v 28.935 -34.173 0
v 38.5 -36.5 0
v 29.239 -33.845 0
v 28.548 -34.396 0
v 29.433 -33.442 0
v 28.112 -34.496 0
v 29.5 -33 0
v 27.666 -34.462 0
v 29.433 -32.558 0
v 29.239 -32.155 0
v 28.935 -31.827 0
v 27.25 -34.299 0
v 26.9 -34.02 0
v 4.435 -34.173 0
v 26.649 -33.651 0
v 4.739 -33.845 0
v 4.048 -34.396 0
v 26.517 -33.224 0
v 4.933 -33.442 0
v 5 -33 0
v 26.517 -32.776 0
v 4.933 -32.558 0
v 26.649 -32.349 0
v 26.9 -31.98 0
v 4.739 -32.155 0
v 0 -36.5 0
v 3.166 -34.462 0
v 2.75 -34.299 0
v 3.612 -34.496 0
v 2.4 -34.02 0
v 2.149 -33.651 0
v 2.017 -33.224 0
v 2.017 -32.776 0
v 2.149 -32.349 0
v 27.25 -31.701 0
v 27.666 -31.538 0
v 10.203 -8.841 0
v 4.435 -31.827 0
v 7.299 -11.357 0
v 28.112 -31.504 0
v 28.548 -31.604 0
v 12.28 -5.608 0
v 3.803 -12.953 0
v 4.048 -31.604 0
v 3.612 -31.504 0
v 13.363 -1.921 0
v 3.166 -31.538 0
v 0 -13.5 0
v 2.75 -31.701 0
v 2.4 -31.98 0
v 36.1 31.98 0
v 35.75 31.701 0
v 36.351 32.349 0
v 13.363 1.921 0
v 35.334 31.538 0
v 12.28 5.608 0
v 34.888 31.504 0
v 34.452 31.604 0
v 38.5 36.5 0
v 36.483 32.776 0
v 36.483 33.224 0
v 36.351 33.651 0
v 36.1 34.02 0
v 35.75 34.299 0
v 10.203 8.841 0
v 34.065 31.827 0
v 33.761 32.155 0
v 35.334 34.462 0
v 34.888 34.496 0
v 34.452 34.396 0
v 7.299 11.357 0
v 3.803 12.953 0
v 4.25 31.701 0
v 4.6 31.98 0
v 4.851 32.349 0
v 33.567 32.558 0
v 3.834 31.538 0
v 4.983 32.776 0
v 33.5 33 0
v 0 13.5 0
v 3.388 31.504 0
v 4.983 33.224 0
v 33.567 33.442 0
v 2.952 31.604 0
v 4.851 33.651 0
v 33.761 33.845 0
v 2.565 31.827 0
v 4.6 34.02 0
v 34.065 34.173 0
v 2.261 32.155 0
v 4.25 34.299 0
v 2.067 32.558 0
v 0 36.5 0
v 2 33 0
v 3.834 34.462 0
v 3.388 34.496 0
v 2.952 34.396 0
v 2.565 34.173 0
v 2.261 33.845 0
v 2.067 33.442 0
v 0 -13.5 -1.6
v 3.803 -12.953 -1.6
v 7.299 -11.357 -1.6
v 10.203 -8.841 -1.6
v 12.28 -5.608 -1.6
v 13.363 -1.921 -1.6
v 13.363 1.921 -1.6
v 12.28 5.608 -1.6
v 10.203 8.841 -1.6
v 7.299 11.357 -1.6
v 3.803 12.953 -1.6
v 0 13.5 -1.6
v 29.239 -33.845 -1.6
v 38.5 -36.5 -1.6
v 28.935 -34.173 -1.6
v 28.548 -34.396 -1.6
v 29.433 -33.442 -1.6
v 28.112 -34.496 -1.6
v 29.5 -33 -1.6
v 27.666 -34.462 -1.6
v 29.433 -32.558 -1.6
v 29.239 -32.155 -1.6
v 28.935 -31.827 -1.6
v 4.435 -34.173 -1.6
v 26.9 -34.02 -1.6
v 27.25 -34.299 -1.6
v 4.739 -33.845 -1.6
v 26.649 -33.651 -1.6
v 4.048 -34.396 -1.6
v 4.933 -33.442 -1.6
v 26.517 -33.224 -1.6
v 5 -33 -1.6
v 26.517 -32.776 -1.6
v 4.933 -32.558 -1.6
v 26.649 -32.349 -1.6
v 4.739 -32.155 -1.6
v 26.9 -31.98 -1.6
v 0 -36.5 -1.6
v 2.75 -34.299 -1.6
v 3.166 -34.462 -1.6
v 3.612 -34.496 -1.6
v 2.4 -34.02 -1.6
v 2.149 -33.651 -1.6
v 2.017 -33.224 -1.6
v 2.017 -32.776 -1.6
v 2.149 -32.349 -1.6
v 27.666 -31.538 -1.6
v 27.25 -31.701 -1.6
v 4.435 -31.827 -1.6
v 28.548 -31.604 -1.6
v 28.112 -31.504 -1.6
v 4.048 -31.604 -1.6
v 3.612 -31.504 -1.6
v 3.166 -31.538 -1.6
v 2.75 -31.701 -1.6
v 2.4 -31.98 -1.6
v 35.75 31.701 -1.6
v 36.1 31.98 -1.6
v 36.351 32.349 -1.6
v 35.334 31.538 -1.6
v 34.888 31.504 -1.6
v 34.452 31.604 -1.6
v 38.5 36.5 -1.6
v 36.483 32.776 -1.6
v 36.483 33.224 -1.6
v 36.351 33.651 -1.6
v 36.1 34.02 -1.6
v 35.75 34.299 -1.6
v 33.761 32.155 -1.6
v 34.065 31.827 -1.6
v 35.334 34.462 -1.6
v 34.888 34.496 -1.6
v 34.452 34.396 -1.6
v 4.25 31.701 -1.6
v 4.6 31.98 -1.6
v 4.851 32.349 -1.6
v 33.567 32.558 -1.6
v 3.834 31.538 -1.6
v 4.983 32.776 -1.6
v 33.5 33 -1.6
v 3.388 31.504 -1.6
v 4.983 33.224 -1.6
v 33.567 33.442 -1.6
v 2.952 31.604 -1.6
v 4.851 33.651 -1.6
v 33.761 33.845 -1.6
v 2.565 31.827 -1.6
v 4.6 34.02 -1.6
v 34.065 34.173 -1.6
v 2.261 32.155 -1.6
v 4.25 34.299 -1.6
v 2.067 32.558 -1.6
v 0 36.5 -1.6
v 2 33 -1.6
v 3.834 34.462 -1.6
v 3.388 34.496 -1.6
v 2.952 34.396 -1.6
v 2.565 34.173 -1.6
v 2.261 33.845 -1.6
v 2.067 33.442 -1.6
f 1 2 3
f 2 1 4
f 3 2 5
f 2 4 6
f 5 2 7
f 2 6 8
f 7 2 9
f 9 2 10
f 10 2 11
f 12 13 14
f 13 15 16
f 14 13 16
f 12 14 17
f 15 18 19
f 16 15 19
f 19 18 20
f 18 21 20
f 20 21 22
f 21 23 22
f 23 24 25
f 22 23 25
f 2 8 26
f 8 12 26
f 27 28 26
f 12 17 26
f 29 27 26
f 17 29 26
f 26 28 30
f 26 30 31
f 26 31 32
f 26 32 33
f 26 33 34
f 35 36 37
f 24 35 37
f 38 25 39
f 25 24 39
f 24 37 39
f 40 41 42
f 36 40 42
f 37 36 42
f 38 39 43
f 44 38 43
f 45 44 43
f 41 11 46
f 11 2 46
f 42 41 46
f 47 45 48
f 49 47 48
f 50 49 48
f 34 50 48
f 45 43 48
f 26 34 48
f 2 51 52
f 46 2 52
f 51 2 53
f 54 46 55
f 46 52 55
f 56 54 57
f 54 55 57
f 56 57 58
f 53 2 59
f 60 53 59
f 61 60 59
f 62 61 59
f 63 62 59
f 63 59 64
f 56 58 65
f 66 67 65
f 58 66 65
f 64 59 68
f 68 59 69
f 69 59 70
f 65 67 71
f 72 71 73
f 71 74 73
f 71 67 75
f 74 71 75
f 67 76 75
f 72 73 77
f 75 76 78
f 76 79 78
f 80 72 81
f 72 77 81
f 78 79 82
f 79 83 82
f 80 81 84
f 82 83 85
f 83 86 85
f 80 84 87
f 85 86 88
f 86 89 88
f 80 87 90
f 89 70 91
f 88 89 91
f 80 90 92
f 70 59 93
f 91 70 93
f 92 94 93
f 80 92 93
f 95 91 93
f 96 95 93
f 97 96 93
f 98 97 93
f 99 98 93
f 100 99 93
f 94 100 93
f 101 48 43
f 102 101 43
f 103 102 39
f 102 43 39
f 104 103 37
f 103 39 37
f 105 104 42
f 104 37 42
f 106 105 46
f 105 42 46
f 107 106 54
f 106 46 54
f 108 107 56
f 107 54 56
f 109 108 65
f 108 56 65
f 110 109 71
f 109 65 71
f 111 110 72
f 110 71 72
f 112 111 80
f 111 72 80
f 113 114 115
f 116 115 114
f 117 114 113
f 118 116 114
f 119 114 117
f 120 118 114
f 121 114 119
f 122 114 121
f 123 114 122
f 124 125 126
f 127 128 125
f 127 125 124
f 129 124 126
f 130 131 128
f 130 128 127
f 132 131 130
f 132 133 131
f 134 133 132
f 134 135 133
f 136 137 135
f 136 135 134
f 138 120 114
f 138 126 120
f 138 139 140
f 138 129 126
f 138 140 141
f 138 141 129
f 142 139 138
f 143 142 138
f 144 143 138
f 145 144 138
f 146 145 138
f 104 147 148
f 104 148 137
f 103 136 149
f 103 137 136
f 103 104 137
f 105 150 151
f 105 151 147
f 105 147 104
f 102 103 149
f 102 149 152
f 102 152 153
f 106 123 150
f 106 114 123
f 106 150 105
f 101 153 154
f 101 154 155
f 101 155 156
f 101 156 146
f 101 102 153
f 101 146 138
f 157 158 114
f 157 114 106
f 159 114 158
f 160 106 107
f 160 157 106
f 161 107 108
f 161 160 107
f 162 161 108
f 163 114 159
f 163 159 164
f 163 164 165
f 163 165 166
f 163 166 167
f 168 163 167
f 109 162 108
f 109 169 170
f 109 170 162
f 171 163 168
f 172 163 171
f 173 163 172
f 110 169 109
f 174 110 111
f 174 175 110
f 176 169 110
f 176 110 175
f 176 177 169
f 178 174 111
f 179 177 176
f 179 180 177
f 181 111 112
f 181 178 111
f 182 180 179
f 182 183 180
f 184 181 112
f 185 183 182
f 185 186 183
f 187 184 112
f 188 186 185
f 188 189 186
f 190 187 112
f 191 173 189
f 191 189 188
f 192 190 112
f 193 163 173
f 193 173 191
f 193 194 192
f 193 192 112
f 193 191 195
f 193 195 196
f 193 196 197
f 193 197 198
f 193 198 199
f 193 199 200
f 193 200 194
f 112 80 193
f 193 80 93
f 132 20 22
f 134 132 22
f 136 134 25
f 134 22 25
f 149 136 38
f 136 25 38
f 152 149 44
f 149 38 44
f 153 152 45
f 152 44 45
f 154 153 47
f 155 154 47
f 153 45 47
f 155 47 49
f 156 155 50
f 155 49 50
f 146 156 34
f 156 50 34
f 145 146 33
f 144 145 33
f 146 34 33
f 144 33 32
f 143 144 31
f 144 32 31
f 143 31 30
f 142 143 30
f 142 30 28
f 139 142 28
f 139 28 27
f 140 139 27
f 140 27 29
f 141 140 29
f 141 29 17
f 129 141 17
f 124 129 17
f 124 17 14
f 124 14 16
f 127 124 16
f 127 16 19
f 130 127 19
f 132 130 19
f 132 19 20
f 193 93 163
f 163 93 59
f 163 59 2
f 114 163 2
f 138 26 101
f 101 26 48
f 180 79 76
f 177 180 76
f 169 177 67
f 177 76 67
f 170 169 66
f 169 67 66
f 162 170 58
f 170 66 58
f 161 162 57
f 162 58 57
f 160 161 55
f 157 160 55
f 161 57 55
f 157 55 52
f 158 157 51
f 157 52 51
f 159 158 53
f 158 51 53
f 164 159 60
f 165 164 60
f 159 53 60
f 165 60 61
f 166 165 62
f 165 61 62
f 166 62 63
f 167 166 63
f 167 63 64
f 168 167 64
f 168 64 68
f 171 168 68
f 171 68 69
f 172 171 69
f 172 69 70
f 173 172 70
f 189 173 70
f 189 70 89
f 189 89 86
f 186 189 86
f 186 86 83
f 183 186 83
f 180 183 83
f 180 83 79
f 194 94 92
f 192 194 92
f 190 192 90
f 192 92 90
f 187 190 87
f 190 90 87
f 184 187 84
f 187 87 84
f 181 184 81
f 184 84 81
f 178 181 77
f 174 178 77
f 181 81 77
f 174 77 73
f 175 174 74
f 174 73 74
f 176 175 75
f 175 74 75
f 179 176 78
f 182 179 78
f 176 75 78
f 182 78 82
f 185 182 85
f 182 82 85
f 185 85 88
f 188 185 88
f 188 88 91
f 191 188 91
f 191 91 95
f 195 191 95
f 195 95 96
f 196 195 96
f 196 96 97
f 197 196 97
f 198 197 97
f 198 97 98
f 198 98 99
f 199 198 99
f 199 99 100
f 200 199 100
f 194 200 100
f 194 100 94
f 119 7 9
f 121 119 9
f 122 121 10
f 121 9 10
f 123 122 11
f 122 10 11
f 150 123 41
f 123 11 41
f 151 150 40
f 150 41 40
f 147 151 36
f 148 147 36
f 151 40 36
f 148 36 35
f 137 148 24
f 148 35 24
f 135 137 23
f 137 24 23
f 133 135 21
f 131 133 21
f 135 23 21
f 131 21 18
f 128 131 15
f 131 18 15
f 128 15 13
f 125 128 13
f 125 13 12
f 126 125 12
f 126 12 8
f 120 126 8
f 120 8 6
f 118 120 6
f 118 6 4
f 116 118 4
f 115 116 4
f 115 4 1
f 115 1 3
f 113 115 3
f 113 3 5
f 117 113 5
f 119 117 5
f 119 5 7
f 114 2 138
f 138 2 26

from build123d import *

# Parameters (mm, degrees)
BOSS_EXTRUDE1_DEPTH = 1.6
SKETCH4_R           = 1.5
CUT_EXTRUDE1_DEPTH  = 54.075983269


with BuildPart() as part:
    # Sketch3 → Boss-Extrude1 (new body)
    with BuildSketch(Plane.XY):
        with BuildLine():
            Line((13.5, 36.5), (38.5, 36.5))
            Line((38.5, 36.5), (38.5, -36.5))
            Line((38.5, -36.5), (13.5, -36.5))
            Line((13.5, -36.5), (0, -36.5))
            Line((0, -36.5), (0, -13.5))
            ThreePointArc((0, -13.5), (13.5, 0), (0, 13.5))
            Line((0, 13.5), (0, 36.5))
            Line((0, 36.5), (13.5, 36.5))
        make_face()
    extrude(amount=-BOSS_EXTRUDE1_DEPTH)

    # Sketch4 → Cut-Extrude1 (cut, through all)
    with BuildSketch(Plane.XY):
        with Locations(Location((35, 33, 0), (0, 0, 180))):
            Circle(SKETCH4_R)
        with Locations((3.5, -33)):
            Circle(SKETCH4_R)
        with Locations(Location((3.5, 33, 0), (0, 0, 180))):
            Circle(SKETCH4_R)
        with Locations((28, -33)):
            Circle(SKETCH4_R)
    extrude(amount=-CUT_EXTRUDE1_DEPTH, mode=Mode.SUBTRACT)


solid = part.part
